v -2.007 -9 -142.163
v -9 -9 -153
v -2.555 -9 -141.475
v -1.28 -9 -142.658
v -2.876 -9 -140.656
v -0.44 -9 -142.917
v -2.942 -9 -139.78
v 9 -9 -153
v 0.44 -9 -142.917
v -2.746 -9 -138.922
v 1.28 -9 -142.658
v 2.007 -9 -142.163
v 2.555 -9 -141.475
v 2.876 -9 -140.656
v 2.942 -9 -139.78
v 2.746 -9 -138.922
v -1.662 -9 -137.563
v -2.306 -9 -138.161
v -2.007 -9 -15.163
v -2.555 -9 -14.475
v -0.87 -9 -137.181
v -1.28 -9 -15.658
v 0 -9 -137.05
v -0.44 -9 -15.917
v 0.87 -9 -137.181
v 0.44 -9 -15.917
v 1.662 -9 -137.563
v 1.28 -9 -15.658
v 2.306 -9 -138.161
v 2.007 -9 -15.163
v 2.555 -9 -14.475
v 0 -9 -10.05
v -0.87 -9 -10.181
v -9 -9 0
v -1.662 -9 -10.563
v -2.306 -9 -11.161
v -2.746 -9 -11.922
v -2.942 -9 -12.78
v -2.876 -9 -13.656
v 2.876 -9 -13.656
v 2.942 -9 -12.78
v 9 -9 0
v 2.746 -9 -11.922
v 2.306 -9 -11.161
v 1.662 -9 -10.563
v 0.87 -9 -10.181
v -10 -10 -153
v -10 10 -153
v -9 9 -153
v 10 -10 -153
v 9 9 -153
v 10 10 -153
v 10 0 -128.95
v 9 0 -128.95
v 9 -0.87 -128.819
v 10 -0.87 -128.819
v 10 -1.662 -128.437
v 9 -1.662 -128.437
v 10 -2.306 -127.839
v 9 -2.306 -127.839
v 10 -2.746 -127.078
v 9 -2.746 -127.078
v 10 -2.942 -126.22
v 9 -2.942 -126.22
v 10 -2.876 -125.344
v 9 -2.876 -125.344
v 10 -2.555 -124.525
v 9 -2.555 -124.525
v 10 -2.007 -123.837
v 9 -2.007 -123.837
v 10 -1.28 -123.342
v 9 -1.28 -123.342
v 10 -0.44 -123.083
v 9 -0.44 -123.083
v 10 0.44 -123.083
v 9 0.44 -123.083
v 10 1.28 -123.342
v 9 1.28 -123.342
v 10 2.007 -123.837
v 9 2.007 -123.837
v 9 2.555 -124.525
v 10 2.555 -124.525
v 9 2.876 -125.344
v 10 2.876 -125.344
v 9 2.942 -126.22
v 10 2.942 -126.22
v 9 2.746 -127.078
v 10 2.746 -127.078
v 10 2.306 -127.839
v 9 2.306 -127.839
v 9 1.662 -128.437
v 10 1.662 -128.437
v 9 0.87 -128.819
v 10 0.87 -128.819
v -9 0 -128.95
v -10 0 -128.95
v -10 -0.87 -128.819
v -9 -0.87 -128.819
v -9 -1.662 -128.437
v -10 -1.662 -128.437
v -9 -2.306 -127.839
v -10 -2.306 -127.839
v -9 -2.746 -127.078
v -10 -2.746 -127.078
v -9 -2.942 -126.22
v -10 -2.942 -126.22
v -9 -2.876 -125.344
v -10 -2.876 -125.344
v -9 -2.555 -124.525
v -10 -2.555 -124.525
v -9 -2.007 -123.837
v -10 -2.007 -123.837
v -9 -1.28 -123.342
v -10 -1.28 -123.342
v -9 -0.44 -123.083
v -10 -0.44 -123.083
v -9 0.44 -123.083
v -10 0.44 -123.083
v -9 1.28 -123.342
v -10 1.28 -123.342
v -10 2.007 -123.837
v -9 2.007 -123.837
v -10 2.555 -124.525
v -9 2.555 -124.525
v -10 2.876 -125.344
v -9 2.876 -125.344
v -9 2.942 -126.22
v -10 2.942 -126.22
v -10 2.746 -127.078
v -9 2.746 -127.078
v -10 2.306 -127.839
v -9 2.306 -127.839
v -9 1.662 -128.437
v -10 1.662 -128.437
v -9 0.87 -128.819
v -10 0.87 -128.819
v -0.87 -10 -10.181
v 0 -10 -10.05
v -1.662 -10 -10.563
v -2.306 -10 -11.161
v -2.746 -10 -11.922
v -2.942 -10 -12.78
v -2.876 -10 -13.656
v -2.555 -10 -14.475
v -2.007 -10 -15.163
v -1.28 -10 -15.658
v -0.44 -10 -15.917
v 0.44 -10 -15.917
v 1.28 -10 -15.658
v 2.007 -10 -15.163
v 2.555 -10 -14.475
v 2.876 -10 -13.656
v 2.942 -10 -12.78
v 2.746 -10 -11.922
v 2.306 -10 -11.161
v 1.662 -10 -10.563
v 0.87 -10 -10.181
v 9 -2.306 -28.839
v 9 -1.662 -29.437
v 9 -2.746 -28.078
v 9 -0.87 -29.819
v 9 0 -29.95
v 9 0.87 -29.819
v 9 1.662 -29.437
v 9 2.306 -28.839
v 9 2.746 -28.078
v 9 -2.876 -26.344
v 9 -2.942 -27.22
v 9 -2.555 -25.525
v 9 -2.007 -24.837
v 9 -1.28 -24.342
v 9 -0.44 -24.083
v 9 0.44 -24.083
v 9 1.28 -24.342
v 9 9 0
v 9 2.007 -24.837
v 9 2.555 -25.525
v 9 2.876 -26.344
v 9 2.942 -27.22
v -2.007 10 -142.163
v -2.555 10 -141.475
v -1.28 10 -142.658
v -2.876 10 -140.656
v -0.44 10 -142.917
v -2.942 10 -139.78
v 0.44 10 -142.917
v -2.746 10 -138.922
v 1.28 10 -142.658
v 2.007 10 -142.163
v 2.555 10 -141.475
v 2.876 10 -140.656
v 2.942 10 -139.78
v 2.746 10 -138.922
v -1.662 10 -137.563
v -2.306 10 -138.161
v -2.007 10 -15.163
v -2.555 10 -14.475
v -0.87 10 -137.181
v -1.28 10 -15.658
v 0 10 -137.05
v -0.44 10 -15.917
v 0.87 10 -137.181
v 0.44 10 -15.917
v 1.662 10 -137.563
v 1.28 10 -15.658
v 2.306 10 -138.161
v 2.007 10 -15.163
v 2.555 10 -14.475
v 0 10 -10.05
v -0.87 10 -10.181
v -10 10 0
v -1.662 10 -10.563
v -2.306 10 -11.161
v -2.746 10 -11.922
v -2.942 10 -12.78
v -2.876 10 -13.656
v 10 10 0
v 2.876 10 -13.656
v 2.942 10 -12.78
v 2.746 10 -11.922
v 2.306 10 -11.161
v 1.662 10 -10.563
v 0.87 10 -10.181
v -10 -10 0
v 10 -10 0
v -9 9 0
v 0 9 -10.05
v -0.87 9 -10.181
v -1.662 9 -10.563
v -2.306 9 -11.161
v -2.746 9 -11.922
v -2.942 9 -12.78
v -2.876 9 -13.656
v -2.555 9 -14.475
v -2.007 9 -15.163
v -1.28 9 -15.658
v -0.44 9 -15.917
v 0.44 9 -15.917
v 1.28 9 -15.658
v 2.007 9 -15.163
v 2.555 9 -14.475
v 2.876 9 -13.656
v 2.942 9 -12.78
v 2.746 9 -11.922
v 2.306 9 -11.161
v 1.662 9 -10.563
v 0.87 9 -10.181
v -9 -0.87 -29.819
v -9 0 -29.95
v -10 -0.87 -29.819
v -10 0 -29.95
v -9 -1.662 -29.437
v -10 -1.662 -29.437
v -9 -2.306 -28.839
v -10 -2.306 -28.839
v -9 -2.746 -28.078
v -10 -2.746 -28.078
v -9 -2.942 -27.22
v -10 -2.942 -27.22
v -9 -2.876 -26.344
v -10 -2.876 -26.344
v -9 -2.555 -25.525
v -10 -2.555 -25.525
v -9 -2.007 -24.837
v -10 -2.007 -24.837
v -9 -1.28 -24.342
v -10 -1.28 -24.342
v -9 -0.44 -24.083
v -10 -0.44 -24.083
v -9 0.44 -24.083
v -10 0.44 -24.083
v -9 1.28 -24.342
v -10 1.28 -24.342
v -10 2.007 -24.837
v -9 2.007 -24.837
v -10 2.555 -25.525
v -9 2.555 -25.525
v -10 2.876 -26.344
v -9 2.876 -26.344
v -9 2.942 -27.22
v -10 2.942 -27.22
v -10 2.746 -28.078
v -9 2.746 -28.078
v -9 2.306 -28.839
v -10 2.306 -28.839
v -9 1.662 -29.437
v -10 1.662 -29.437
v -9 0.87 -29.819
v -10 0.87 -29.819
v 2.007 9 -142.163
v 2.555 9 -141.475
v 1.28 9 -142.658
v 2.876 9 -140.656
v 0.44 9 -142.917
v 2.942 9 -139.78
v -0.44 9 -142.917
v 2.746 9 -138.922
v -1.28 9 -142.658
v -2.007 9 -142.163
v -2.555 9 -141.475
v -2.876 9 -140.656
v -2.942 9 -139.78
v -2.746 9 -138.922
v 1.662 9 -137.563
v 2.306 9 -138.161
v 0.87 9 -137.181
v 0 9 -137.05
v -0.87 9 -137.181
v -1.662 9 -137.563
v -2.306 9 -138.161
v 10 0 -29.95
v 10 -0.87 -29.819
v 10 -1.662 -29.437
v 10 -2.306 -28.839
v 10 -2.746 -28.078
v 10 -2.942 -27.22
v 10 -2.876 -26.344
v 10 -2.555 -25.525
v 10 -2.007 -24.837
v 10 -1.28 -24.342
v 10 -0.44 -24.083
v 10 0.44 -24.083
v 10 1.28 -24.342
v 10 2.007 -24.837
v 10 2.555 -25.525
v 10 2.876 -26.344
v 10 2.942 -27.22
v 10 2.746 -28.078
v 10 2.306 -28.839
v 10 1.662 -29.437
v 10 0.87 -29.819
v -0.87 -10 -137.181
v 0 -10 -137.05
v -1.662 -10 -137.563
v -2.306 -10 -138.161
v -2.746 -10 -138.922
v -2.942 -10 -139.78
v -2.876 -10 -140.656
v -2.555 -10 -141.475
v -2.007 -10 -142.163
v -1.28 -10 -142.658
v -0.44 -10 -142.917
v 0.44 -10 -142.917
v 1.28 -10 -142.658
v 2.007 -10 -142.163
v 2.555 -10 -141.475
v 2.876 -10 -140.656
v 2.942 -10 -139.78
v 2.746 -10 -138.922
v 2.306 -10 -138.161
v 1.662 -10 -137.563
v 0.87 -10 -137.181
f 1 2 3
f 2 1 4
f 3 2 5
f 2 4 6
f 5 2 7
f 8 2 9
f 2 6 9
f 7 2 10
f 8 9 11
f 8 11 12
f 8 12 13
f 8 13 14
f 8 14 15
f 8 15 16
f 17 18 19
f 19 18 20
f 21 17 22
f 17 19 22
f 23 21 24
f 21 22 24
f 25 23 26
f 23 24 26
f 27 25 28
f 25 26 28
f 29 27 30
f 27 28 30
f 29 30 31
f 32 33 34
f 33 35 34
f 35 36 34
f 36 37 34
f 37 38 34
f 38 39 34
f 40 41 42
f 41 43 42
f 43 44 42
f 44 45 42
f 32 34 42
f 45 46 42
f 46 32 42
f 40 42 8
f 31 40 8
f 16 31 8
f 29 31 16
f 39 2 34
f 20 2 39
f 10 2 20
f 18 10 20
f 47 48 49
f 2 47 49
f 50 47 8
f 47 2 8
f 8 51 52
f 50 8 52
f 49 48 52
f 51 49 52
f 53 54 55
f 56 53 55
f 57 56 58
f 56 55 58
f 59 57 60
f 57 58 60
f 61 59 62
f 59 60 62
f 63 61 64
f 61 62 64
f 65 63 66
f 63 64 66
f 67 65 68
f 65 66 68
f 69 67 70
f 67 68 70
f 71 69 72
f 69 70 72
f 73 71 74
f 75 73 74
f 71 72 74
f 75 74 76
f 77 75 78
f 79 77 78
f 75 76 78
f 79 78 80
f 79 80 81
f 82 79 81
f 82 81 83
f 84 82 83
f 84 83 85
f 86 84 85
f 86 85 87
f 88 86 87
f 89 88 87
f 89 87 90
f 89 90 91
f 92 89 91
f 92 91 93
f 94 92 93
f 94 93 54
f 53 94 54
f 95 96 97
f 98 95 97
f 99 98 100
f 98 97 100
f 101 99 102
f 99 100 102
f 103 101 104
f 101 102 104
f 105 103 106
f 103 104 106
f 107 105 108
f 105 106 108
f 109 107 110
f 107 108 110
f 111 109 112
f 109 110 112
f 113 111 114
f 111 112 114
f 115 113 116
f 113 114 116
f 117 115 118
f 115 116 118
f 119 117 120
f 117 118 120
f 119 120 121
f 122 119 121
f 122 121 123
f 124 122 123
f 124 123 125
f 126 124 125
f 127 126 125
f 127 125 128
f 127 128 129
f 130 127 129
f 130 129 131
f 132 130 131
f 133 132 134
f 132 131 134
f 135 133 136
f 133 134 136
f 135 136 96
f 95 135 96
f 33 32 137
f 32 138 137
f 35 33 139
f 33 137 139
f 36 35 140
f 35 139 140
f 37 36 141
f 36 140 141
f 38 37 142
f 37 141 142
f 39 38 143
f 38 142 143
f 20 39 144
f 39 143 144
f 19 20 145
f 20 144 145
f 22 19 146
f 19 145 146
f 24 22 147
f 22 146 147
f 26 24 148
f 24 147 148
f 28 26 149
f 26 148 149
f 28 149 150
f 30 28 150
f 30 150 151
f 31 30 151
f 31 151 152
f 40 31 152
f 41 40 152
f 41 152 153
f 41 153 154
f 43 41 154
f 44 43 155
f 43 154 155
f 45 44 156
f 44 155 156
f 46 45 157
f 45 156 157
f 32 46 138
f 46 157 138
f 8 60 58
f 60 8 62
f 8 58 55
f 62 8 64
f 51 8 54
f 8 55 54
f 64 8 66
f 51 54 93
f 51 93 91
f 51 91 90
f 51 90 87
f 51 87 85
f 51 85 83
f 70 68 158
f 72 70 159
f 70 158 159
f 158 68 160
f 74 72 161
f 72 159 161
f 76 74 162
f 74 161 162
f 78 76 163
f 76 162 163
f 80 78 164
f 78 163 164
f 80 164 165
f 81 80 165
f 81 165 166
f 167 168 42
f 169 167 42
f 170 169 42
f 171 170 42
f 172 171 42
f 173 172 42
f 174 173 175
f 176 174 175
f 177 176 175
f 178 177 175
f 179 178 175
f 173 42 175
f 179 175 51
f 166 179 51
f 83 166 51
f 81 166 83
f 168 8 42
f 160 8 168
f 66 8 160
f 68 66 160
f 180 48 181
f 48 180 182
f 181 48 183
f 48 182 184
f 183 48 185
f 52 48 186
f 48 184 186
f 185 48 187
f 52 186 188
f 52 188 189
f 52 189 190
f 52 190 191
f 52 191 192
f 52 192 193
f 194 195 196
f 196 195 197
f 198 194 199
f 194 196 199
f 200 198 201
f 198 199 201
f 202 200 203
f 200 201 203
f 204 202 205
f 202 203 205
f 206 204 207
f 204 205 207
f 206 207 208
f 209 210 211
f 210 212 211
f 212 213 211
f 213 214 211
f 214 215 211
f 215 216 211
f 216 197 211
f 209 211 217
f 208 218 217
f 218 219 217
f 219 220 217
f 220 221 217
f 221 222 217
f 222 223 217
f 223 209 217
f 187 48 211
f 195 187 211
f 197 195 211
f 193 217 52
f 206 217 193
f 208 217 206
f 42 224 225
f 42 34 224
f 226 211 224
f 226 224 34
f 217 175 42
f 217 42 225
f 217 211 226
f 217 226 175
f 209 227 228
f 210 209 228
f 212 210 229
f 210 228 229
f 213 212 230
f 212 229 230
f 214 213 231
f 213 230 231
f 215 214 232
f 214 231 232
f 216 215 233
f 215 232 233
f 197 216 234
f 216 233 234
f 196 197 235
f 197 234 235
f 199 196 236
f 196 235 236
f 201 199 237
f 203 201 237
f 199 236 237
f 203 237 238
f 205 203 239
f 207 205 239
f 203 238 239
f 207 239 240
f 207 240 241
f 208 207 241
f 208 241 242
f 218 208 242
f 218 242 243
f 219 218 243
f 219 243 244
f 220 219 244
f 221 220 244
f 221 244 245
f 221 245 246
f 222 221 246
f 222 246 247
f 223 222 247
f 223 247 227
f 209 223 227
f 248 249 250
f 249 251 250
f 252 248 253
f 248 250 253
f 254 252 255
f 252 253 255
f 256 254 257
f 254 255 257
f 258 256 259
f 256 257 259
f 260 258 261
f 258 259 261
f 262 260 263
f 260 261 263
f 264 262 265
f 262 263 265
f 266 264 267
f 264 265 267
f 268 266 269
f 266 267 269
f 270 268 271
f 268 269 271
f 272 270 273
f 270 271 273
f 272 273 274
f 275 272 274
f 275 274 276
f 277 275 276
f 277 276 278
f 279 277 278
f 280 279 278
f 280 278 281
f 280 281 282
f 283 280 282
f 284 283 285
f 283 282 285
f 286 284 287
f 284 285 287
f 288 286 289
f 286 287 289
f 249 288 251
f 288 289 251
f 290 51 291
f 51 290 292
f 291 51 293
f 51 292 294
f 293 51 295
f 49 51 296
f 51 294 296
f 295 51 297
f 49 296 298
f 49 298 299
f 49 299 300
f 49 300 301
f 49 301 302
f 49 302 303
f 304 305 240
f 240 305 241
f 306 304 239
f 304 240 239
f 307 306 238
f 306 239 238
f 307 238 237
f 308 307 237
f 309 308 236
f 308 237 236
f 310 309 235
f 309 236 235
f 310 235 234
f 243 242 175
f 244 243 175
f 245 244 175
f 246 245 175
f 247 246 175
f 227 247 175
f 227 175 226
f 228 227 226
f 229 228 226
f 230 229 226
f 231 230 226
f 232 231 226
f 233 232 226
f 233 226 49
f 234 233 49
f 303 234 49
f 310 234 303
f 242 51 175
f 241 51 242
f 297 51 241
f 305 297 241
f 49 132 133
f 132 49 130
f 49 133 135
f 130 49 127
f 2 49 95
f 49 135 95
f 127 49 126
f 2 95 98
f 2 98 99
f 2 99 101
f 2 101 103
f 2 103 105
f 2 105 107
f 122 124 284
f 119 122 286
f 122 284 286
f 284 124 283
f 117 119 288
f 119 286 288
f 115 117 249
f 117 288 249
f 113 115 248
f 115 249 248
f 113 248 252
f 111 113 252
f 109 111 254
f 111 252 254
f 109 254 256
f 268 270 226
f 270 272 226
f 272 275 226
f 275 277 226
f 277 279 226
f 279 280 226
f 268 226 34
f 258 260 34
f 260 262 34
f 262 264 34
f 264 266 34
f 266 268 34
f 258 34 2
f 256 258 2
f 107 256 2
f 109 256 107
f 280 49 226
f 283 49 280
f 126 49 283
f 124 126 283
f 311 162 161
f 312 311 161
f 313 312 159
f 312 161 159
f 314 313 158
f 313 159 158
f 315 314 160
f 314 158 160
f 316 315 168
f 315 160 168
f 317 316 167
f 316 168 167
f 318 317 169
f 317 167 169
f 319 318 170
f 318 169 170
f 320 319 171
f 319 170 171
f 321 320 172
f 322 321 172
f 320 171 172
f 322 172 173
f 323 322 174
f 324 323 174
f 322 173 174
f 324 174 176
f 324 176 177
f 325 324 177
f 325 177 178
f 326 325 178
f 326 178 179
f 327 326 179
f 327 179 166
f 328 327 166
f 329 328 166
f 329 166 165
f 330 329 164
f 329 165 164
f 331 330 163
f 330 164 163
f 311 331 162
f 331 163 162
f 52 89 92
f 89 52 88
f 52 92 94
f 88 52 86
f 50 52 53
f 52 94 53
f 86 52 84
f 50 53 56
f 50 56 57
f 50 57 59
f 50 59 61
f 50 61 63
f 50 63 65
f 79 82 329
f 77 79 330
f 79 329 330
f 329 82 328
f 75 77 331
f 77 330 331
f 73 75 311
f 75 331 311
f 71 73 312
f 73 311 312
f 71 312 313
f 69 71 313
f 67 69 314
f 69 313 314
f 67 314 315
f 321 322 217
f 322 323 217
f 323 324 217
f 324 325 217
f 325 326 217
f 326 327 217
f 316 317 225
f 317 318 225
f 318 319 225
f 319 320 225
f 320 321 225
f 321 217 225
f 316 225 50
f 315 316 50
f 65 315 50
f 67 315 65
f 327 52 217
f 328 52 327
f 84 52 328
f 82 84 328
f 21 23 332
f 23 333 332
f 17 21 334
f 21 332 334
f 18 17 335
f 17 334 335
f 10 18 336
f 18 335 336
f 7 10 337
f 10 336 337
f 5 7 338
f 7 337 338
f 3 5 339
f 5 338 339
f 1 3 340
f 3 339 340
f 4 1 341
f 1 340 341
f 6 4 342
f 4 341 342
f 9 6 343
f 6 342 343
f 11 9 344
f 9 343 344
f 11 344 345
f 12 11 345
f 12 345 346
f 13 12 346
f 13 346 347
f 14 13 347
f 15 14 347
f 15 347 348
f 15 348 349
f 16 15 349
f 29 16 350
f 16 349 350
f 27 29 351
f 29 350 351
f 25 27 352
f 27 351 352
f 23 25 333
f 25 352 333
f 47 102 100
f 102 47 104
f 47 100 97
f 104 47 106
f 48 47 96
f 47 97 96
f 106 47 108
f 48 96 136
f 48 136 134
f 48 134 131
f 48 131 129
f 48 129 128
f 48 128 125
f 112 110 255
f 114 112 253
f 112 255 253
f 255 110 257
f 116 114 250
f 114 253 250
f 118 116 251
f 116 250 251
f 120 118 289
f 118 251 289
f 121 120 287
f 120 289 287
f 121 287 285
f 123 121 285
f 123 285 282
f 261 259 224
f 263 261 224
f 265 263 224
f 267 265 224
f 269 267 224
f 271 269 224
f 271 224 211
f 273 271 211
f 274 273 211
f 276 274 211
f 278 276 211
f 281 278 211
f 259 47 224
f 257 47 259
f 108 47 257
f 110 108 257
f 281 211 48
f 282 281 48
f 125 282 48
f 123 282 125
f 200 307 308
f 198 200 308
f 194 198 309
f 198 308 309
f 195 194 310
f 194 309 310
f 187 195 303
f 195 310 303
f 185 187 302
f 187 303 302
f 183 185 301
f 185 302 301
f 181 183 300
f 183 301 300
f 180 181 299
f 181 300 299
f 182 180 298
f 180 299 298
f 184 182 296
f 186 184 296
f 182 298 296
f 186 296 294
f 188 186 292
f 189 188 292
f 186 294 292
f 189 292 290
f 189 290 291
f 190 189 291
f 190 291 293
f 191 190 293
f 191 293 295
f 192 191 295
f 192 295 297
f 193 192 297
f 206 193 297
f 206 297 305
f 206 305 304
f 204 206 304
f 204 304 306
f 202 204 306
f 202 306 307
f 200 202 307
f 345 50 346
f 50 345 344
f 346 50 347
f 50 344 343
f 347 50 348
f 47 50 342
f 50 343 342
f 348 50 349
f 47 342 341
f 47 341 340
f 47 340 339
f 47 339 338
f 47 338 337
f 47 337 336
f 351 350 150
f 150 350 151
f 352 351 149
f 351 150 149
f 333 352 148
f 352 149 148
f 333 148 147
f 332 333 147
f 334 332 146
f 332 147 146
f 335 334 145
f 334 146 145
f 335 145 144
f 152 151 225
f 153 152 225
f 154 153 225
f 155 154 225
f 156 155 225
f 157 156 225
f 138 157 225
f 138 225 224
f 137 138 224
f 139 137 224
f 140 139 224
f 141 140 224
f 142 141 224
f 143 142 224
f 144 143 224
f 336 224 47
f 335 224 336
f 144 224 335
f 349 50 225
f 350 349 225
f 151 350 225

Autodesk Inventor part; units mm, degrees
ref_plane "YZ Plane" through (0, 0, 0) normal (1, 0, 0) x (0, 1, 0)
ref_plane "XZ Plane" through (0, 0, 0) normal (0, 1, 0) x (-1, 0, 0)
ref_plane "XY Plane" through (0, 0, 0) normal (0, 0, 1) x (1, 0, 0)
sketch "Schizzo1" plane through (0, 0, 0) normal (0, 0, 1) x (1, 0, 0)
  line L0 (10, -10) -> (-10, -10)
  line L1 (-10, -10) -> (-10, 10)
  line L2 (-10, 10) -> (10, 10)
  line L3 (10, 10) -> (10, -10)
  line L4 (9, 9) -> (-9, 9)
  line L5 (-9, 9) -> (-9, -9)
  line L6 (-9, -9) -> (9, -9)
  line L7 (9, -9) -> (9, 9)
  point P0 (0, 0)
  point P1 (0, 0)
  dimension "d0" = 20
  dimension "d1" = 1
extrude "Estrusione1" add sketch "Schizzo1" against normal blind 153
sketch "Schizzo8" plane through (10, -10, 0) normal (1, 0, 0) x (0, 0, -1)
  circle A0 centre (126, 10) radius 2.75
  circle A1 centre (27, 10) radius 2.95
  circle A2 centre (126, 10) radius 2.75
  circle A3 centre (27, 10) radius 2.95
  point P0 (0, 10)
hole "Foro7" at (10, 0, -126) at (10, 0, -27) direction (-1, 0, 0) diameter 5.9 end through all clearance for "Vite a testa piana" size "M5" standard "ANSI - Profilo M Metrico"
sketch "Schizzo9" plane through (-10, 10, 0) normal (0, 1, 0) x (1, 0, 0)
  circle A0 centre (10, 13) radius 2.95
  circle A1 centre (10, 140) radius 2.75
  circle A2 centre (10, 13) radius 2.95
  circle A3 centre (10, 140) radius 2.75
  point P0 (10, 0)
hole "Foro8" at (0, 10, -13) at (0, 10, -140) direction (0, -1, 0) diameter 5.9 end through all clearance for "Vite a testa piana" size "M5" standard "ANSI - Profilo M Metrico"
properties part number "4_barra" material "Alluminio D=2.26"
